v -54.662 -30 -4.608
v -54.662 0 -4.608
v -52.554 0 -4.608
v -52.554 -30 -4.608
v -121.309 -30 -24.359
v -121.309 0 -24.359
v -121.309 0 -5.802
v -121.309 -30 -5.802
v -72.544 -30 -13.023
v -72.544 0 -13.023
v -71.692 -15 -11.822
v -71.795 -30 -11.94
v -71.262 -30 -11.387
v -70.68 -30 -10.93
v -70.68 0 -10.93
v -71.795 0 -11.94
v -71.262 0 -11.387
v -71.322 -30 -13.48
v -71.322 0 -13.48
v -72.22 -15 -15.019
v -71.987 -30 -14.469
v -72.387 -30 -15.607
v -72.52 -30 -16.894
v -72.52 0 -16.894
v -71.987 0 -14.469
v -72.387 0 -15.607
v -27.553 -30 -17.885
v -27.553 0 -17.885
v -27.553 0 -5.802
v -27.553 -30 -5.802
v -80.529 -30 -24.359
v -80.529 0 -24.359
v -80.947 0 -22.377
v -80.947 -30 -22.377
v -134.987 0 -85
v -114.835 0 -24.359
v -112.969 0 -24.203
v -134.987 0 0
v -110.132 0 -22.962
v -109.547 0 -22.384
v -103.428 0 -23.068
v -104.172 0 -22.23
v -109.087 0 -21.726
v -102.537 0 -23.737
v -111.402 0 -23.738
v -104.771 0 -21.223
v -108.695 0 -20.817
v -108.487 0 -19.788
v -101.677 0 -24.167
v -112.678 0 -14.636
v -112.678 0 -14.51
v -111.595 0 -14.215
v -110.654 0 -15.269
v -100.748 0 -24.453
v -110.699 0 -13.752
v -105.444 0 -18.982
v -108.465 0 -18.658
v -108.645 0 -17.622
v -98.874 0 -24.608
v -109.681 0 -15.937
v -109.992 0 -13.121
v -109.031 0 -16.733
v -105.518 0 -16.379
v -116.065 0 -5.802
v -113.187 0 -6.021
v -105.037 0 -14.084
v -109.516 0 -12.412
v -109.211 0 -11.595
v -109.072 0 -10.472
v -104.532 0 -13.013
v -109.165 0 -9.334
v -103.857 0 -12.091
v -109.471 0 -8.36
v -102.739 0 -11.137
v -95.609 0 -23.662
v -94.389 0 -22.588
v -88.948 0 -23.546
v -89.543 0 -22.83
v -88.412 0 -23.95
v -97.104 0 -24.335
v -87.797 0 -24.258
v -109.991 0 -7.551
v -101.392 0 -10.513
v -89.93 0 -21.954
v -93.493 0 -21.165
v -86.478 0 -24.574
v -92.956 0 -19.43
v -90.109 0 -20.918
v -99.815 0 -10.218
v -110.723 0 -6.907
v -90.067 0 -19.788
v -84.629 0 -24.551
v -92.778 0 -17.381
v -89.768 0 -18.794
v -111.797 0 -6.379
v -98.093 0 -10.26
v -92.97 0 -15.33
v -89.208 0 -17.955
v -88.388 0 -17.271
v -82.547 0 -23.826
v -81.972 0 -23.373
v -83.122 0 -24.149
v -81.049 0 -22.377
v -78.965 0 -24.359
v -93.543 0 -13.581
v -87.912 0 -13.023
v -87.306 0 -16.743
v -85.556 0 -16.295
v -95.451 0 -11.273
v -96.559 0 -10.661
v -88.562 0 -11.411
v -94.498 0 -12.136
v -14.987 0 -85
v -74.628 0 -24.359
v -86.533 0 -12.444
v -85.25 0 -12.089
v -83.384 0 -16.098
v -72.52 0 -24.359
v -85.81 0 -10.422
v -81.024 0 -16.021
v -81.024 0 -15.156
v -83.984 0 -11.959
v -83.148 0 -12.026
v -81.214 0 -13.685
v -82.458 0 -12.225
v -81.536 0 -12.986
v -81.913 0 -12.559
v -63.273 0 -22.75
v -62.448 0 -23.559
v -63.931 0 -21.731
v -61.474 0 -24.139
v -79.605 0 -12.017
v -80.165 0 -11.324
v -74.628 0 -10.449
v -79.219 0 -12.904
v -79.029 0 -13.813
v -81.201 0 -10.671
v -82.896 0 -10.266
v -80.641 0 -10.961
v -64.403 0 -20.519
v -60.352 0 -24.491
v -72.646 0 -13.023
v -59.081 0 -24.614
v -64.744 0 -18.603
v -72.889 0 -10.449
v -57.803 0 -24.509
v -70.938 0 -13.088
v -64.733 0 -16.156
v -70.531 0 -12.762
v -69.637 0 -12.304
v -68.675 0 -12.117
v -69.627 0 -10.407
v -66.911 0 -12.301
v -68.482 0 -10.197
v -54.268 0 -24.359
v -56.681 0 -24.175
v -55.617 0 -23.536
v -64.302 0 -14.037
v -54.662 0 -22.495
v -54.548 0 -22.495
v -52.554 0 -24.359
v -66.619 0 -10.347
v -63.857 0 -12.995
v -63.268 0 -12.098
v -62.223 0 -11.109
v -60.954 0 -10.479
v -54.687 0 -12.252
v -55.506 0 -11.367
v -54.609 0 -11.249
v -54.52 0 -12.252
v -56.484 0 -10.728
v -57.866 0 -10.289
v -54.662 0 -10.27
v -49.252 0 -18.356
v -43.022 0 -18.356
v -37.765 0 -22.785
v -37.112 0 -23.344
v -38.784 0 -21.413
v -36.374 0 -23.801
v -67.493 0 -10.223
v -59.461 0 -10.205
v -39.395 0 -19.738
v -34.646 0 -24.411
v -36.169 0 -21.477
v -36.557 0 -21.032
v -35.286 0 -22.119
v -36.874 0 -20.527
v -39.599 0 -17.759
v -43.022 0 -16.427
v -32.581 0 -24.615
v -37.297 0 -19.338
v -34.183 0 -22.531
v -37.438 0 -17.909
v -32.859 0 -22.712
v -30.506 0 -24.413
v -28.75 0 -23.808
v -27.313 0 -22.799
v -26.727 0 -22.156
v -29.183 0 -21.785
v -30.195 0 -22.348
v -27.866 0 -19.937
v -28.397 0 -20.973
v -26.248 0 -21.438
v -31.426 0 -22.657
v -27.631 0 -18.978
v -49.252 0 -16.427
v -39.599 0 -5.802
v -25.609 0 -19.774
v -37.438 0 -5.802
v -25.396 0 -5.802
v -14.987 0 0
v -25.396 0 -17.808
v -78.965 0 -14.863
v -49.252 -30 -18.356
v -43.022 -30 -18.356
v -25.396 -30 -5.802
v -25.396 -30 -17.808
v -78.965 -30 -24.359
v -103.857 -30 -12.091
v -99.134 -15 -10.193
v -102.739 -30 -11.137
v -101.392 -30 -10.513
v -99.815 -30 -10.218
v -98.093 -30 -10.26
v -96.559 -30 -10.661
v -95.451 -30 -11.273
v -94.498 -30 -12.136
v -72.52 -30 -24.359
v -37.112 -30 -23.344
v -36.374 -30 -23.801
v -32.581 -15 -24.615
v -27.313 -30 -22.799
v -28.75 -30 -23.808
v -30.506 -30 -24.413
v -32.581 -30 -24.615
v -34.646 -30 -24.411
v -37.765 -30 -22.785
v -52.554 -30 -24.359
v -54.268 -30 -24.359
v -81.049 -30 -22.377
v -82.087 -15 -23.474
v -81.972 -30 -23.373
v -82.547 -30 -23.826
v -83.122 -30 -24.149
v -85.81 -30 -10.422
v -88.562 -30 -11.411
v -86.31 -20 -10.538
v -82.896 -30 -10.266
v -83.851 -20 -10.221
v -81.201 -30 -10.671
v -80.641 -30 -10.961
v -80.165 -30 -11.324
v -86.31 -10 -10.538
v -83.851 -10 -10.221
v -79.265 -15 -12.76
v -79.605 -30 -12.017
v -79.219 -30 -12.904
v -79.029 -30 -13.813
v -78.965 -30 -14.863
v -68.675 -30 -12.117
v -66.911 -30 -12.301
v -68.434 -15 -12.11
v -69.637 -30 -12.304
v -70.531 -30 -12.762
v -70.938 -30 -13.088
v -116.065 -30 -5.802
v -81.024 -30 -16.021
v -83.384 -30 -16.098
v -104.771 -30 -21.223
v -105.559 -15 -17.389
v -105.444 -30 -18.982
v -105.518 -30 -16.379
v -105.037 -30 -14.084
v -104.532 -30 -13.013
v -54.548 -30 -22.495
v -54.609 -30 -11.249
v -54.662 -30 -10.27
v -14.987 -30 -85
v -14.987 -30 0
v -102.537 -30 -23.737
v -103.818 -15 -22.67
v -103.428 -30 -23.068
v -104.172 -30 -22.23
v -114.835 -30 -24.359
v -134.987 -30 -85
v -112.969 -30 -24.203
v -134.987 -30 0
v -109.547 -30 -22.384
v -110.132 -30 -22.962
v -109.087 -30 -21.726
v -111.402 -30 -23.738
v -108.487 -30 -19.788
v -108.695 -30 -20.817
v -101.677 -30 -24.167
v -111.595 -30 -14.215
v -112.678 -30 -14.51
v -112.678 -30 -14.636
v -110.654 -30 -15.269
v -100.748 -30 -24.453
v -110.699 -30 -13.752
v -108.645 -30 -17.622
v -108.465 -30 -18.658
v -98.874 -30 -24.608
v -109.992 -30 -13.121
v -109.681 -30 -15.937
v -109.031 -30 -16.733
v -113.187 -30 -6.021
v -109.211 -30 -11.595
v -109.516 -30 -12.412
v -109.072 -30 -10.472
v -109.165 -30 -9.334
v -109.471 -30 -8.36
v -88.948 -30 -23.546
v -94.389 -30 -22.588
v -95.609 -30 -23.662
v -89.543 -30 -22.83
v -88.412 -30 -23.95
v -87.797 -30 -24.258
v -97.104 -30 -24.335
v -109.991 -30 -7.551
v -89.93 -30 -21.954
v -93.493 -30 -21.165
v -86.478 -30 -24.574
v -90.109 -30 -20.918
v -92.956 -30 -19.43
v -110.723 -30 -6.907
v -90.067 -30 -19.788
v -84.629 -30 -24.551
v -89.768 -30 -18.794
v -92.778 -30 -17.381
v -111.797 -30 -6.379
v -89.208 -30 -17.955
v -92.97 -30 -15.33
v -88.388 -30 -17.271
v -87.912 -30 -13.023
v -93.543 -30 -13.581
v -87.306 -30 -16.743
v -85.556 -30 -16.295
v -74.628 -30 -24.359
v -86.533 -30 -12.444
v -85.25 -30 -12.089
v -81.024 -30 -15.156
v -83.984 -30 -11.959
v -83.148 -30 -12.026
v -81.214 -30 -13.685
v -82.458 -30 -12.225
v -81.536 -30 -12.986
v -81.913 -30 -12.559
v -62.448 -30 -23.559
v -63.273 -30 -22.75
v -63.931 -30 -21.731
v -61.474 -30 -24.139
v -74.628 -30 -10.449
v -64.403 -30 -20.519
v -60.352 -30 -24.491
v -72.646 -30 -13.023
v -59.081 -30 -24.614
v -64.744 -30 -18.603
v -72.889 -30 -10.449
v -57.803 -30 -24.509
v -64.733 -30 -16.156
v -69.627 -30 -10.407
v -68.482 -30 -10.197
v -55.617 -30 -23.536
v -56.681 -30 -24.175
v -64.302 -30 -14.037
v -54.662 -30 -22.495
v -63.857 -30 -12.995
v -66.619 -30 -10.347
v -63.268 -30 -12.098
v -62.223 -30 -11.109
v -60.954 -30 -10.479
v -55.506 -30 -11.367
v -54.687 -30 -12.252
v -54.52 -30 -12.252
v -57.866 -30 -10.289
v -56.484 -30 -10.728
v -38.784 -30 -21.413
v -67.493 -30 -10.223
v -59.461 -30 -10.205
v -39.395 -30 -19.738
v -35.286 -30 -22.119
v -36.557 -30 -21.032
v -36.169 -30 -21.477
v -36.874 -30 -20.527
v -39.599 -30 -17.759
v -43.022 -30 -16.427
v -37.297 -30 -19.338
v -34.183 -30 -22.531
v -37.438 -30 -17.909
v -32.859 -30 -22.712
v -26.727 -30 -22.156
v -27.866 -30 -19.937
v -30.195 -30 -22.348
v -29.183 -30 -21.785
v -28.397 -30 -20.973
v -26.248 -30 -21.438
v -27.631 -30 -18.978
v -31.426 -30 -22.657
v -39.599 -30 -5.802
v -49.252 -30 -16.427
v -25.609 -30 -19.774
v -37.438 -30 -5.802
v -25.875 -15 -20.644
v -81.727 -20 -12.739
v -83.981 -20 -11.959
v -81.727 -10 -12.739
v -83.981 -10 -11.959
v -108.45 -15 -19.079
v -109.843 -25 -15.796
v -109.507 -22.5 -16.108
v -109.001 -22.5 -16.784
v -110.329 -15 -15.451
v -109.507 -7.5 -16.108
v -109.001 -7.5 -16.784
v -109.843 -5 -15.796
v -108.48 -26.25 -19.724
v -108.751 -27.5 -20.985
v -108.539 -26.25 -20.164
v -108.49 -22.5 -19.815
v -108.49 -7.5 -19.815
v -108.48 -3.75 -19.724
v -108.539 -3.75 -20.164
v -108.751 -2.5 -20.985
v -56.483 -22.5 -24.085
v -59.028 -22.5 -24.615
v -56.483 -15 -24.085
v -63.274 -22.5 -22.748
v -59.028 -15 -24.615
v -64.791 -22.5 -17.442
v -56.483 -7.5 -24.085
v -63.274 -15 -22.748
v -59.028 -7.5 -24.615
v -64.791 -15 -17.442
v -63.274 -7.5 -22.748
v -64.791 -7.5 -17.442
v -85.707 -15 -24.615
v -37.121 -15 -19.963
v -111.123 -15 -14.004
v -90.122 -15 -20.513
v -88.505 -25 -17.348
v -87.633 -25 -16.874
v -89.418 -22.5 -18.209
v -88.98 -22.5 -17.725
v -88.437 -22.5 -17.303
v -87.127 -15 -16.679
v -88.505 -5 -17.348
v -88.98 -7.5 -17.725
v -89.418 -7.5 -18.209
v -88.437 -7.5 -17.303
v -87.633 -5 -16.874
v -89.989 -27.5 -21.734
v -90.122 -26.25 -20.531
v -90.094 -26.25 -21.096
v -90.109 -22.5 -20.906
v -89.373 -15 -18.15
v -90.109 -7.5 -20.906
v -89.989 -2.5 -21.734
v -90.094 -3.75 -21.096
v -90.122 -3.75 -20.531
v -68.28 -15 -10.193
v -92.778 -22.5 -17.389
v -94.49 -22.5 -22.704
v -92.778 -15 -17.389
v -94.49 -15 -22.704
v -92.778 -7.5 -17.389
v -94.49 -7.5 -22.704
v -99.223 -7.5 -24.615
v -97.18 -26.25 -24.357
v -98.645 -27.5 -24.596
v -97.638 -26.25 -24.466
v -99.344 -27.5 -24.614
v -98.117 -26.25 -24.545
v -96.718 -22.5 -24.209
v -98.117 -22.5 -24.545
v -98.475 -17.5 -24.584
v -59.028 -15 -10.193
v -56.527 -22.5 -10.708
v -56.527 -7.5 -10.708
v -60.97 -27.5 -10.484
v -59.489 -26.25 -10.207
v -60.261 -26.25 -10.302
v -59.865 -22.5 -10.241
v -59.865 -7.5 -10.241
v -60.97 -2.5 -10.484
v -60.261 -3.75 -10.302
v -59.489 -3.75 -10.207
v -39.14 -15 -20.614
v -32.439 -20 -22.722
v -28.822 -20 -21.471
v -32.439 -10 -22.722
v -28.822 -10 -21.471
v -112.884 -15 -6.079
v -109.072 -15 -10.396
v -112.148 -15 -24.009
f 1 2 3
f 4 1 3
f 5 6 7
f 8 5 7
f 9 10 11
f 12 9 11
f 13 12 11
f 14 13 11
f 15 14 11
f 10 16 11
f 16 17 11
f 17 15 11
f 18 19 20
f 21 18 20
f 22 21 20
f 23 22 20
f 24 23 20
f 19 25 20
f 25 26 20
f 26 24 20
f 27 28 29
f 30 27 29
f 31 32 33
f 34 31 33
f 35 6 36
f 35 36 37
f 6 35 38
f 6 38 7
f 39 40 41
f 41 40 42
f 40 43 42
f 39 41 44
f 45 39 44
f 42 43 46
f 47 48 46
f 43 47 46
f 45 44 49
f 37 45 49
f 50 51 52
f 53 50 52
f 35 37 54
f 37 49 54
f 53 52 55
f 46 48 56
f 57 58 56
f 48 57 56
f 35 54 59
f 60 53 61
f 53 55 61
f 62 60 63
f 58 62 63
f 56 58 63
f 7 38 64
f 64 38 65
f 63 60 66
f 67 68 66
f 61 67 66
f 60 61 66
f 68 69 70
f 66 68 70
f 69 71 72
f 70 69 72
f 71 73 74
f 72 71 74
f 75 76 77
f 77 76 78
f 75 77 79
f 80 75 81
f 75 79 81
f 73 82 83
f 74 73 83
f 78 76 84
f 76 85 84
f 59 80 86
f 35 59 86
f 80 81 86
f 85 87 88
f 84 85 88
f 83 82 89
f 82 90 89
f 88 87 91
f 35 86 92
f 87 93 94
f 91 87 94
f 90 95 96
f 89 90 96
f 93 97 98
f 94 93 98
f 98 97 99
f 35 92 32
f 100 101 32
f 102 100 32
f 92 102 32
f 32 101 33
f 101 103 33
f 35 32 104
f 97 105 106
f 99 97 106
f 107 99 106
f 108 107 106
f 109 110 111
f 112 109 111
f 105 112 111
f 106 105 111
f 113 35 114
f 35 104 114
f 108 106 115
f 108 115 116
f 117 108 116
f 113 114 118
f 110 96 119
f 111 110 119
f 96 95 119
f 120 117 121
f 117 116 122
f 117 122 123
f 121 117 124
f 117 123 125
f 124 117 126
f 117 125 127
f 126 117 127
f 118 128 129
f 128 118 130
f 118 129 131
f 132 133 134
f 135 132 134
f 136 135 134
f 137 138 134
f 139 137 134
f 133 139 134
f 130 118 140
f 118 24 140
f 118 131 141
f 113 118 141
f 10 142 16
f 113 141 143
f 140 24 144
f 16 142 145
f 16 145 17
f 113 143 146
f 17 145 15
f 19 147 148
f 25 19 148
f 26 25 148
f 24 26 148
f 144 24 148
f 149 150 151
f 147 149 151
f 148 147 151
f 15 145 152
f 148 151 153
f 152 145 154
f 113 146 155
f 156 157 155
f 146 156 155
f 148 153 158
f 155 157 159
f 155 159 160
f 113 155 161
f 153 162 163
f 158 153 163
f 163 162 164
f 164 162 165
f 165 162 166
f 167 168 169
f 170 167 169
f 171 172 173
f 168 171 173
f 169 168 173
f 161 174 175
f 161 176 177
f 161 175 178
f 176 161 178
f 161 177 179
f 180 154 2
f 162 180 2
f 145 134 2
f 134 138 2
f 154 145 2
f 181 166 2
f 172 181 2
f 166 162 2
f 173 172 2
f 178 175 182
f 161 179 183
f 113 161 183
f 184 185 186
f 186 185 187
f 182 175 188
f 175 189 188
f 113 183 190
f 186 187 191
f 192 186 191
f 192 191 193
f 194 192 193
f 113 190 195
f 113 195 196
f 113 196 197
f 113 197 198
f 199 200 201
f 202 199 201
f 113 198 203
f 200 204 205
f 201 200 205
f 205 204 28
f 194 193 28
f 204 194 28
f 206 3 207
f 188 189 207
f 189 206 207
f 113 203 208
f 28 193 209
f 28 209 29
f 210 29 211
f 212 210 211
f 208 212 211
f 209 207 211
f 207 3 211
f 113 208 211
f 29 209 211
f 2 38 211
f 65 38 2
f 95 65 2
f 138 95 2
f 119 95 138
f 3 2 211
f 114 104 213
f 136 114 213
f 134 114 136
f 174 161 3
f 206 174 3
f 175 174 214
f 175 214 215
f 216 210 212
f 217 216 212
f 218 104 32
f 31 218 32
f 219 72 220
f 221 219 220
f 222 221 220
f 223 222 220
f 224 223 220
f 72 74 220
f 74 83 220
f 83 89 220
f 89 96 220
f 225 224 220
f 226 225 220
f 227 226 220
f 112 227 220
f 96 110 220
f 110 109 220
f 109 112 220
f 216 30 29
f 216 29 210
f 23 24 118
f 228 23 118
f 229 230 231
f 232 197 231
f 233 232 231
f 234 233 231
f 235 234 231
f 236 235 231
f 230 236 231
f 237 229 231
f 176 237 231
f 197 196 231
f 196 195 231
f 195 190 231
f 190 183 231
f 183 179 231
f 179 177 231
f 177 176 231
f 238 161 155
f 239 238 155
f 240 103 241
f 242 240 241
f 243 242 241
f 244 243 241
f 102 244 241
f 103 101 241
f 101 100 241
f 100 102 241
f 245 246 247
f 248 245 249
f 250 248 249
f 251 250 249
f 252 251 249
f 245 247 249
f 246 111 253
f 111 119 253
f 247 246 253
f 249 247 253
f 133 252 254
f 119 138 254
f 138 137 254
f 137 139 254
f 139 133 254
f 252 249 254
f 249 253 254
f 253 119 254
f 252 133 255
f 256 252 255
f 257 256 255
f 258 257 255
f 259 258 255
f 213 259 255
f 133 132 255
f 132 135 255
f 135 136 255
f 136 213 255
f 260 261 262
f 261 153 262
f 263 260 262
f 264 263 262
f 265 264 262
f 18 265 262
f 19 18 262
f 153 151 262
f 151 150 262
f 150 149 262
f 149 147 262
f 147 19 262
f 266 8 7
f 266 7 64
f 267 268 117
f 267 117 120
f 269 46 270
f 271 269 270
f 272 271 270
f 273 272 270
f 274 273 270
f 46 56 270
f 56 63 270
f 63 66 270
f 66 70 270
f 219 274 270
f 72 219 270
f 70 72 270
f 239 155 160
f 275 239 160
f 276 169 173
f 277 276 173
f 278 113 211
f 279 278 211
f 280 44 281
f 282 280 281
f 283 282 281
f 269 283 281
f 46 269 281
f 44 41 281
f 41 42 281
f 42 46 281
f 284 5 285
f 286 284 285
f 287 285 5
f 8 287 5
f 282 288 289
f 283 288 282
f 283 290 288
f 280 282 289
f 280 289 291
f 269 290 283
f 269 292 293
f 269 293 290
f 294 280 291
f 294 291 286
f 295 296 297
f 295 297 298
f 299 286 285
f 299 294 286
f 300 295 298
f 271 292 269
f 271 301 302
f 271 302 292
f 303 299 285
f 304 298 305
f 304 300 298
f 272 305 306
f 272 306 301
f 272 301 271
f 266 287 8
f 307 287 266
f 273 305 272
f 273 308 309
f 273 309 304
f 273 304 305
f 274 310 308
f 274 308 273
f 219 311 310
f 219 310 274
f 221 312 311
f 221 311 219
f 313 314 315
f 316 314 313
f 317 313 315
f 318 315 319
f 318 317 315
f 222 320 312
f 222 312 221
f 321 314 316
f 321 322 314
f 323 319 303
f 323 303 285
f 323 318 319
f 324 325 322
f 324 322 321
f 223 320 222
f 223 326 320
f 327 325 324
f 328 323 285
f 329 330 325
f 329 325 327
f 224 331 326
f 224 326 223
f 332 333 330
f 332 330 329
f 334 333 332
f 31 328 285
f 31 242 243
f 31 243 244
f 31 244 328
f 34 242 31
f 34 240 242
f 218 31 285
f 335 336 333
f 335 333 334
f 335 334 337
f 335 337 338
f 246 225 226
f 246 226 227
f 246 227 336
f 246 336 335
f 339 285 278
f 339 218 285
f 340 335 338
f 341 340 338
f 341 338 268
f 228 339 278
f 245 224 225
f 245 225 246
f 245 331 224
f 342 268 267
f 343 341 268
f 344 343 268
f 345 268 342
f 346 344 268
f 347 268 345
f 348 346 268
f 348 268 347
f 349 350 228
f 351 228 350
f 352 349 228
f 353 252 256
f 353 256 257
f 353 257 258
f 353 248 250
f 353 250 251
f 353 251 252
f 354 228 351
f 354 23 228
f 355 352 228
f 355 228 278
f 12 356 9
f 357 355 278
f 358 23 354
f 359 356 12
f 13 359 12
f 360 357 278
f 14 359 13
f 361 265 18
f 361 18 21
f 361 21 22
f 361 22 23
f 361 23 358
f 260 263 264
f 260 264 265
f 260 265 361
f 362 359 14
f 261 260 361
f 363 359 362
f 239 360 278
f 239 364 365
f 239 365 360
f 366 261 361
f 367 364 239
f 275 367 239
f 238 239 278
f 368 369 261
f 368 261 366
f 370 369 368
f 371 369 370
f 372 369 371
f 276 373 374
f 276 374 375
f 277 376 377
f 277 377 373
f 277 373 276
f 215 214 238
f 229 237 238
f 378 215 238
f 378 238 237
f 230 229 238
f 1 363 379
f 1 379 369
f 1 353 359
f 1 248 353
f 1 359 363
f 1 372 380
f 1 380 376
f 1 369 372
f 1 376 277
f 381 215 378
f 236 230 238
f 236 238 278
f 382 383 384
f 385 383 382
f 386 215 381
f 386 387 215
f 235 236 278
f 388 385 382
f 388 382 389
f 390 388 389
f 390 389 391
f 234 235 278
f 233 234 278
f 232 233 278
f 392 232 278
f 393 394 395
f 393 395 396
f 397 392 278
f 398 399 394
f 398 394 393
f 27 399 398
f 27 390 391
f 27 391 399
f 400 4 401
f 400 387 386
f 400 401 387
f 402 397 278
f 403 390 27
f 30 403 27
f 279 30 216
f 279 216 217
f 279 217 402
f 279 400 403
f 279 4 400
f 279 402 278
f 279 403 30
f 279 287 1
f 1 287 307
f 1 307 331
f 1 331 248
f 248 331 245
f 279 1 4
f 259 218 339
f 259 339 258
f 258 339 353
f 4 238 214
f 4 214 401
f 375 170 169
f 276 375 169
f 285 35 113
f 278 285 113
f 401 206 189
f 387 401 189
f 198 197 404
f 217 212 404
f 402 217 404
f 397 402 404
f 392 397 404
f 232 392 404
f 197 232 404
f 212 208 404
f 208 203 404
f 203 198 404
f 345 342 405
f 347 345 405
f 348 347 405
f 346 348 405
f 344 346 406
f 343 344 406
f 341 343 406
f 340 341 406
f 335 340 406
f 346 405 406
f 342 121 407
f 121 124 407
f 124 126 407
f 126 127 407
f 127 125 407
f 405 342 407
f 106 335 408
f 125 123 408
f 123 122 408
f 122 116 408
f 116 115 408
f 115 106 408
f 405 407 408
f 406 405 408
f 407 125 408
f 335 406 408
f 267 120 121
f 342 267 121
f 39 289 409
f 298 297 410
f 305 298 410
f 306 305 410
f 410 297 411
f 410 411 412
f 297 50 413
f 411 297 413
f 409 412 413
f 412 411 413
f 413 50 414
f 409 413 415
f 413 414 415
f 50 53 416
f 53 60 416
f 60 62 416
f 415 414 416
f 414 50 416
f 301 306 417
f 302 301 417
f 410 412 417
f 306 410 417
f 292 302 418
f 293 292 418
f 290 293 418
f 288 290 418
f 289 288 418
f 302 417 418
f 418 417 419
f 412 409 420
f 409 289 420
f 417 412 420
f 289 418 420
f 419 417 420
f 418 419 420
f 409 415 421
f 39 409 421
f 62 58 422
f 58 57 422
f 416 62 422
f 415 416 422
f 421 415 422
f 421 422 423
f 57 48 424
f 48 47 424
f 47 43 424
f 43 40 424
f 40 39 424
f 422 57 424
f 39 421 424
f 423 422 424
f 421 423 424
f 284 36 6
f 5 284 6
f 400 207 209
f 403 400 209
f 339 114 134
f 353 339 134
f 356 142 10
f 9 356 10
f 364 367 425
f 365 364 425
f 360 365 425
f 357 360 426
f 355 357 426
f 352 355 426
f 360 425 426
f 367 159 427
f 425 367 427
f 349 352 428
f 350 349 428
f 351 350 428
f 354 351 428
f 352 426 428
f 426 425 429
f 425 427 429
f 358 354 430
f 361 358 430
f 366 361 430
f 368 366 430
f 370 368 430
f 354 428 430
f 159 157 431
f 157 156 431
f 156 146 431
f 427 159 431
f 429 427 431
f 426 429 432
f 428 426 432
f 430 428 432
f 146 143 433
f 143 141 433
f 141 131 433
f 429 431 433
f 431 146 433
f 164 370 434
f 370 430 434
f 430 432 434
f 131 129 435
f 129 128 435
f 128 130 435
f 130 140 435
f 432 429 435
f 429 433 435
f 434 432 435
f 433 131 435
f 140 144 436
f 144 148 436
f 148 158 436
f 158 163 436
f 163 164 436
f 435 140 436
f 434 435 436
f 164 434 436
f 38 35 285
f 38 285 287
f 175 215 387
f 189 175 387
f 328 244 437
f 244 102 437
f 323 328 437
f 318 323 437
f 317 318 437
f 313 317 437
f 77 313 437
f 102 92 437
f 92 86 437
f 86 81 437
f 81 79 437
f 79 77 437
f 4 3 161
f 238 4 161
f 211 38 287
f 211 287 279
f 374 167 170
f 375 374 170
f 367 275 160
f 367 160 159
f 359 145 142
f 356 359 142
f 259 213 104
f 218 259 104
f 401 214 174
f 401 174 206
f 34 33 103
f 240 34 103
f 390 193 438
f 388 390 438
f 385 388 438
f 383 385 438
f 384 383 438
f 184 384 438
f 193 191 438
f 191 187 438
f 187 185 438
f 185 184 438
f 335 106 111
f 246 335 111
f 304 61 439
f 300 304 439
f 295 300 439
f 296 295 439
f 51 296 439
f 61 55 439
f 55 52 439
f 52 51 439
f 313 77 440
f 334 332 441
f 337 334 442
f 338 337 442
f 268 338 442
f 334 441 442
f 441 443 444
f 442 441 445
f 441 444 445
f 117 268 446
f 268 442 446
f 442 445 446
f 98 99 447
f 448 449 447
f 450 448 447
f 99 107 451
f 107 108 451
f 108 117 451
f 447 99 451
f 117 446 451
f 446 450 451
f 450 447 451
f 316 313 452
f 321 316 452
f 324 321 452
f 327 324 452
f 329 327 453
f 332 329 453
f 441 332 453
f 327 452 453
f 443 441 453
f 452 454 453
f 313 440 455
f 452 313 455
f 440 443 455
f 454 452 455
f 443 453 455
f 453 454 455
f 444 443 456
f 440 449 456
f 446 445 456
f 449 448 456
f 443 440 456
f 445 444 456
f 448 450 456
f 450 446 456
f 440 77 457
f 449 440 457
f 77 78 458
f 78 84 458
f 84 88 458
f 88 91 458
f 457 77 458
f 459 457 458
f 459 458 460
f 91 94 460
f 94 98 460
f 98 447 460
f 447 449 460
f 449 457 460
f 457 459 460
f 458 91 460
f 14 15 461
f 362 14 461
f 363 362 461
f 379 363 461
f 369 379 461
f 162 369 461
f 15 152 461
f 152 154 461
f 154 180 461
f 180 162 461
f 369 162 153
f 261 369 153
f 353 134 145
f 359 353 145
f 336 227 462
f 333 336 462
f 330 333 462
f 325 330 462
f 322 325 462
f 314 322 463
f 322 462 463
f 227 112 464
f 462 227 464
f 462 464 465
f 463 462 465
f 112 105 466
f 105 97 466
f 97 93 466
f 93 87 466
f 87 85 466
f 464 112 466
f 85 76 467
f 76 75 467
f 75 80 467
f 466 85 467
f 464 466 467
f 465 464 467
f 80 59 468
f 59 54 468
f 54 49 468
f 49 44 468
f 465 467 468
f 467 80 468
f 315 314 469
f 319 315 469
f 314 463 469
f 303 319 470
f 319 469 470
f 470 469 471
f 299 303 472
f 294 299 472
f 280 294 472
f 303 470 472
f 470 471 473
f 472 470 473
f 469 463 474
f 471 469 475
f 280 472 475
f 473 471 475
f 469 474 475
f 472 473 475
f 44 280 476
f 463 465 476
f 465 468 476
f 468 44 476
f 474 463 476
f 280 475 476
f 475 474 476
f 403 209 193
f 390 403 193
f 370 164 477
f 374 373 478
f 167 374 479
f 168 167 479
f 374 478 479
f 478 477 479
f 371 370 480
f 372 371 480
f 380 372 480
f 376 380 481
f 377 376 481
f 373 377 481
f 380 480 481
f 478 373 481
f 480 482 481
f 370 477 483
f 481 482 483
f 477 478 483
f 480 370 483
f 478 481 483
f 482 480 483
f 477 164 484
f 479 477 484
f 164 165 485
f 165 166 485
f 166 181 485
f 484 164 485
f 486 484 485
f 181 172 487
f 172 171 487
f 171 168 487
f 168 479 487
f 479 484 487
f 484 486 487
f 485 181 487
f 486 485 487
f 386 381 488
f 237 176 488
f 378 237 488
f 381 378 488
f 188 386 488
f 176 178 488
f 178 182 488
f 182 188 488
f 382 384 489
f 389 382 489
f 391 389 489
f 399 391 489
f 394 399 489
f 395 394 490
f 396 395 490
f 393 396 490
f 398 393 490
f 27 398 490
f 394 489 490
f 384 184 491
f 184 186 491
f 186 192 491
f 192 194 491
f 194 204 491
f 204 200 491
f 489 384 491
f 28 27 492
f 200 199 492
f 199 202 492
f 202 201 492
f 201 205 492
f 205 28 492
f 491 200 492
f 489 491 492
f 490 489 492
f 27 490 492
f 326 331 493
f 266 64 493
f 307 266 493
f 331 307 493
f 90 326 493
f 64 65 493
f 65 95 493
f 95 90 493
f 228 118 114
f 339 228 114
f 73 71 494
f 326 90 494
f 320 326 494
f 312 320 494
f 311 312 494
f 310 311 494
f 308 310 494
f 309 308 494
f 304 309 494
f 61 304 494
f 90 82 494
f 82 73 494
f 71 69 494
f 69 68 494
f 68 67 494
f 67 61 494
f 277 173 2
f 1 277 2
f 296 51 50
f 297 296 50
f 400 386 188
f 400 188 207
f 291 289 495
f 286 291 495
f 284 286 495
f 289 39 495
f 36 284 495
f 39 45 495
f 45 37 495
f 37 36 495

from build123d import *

# Parameters (mm, degrees)
F0_W     = 120
F0_H     = 85
F0_W_2   = 6.2300768045
F0_H_2   = 1.9291306924
F1_DEPTH = 30


with BuildPart() as f1:
    # F0 (on Front) → F1 (new body)
    with BuildSketch(Plane.XZ):
        with Locations((-74.9865994975, -42.5)):
            Rectangle(F0_W, F0_H)
        with BuildLine():
            Line((-121.3085489491, -24.3586543947), (-121.3085489491, -5.8024477979))
            Line((-121.3085489491, -5.8024477979), (-116.0653747936, -5.8024477979))
            add(Edge.make_bspline(
                [(-116.0653747936, -5.8024477979), (-112.3736278476, -5.8024477979), (-110.7226981077, -6.9071289523)],
                knots=[0, 0, 0, 1, 1, 1], degree=2))
            add(Edge.make_bspline(
                [(-110.7226981077, -6.9071289523), (-109.0717683678, -8.0118101066), (-109.0717683678, -10.3958095096)],
                knots=[0, 0, 0, 1, 1, 1], degree=2))
            add(Edge.make_bspline(
                [(-109.0717683678, -10.3958095096), (-109.0717683678, -12.0487699134), (-109.9916591084, -13.1209604456)],
                knots=[0, 0, 0, 1, 1, 1], degree=2))
            add(Edge.make_bspline(
                [(-109.9916591084, -13.1209604456), (-110.9115498491, -14.1931509778), (-112.6782274306, -14.5099345441)],
                knots=[0, 0, 0, 1, 1, 1], degree=2))
            Line((-112.6782274306, -14.5099345441), (-112.6782274306, -14.6358357051))
            add(Edge.make_bspline(
                [(-112.6782274306, -14.6358357051), (-108.4503852184, -15.3587520488), (-108.4503852184, -19.0789282893)],
                knots=[0, 0, 0, 1, 1, 1], degree=2))
            add(Edge.make_bspline(
                [(-108.4503852184, -19.0789282893), (-108.4503852184, -21.5644608866), (-110.1317749166, -22.9615576407)],
                knots=[0, 0, 0, 1, 1, 1], degree=2))
            add(Edge.make_bspline(
                [(-110.1317749166, -22.9615576407), (-111.8131646148, -24.3586543947), (-114.8347924783, -24.3586543947)],
                knots=[0, 0, 0, 1, 1, 1], degree=2))
            Line((-114.8347924783, -24.3586543947), (-121.3085489491, -24.3586543947))
        make_face(mode=Mode.SUBTRACT)
        with BuildLine():
            add(Edge.make_bspline(
                [(-94.4976936528, -12.1360884606), (-92.7777213407, -14.0794338002), (-92.7777213407, -17.3894159355)],
                knots=[0, 0, 0, 1, 1, 1], degree=2))
            add(Edge.make_bspline(
                [(-92.7777213407, -17.3894159355), (-92.7777213407, -20.7928086097), (-94.4895709972, -22.7036633271)],
                knots=[0, 0, 0, 1, 1, 1], degree=2))
            add(Edge.make_bspline(
                [(-94.4895709972, -22.7036633271), (-96.2014206537, -24.6145180445), (-99.2230485172, -24.6145180445)],
                knots=[0, 0, 0, 1, 1, 1], degree=2))
            add(Edge.make_bspline(
                [(-99.2230485172, -24.6145180445), (-101.0912592929, -24.6145180445), (-102.5370919803, -23.7372712454)],
                knots=[0, 0, 0, 1, 1, 1], degree=2))
            add(Edge.make_bspline(
                [(-102.5370919803, -23.7372712454), (-103.9829246676, -22.8600244463), (-104.7708222557, -21.2233093536)],
                knots=[0, 0, 0, 1, 1, 1], degree=2))
            add(Edge.make_bspline(
                [(-104.7708222557, -21.2233093536), (-105.5587198437, -19.5865942609), (-105.5587198437, -17.3894159355)],
                knots=[0, 0, 0, 1, 1, 1], degree=2))
            add(Edge.make_bspline(
                [(-105.5587198437, -17.3894159355), (-105.5587198437, -13.9900845891), (-103.8570235067, -12.0914138551)],
                knots=[0, 0, 0, 1, 1, 1], degree=2))
            add(Edge.make_bspline(
                [(-103.8570235067, -12.0914138551), (-102.1553271696, -10.192743121), (-99.1336993061, -10.192743121)],
                knots=[0, 0, 0, 1, 1, 1], degree=2))
            add(Edge.make_bspline(
                [(-99.1336993061, -10.192743121), (-96.2176659648, -10.192743121), (-94.4976936528, -12.1360884606)],
                knots=[0, 0, 0, 1, 1, 1], degree=2))
        make_face(mode=Mode.SUBTRACT)
        with BuildLine():
            Line((-78.9651455832, -24.3586543947), (-80.528756776, -24.3586543947))
            Line((-80.528756776, -24.3586543947), (-80.9470735367, -22.3767264413))
            Line((-80.9470735367, -22.3767264413), (-81.048606731, -22.3767264413))
            add(Edge.make_bspline(
                [(-81.048606731, -22.3767264413), (-82.088306641, -23.6844739844), (-83.1219145593, -24.1494960144)],
                knots=[0, 0, 0, 1, 1, 1], degree=2))
            add(Edge.make_bspline(
                [(-83.1219145593, -24.1494960144), (-84.1555224777, -24.6145180445), (-85.7069496871, -24.6145180445)],
                knots=[0, 0, 0, 1, 1, 1], degree=2))
            add(Edge.make_bspline(
                [(-85.7069496871, -24.6145180445), (-87.7741655238, -24.6145180445), (-88.9478892503, -23.5463888401)],
                knots=[0, 0, 0, 1, 1, 1], degree=2))
            add(Edge.make_bspline(
                [(-88.9478892503, -23.5463888401), (-90.1216129769, -22.4782596356), (-90.1216129769, -20.5125769933)],
                knots=[0, 0, 0, 1, 1, 1], degree=2))
            add(Edge.make_bspline(
                [(-90.1216129769, -20.5125769933), (-90.1216129769, -16.3009800922), (-83.3838702007, -16.0979137036)],
                knots=[0, 0, 0, 1, 1, 1], degree=2))
            Line((-83.3838702007, -16.0979137036), (-81.0242387644, -16.0207484759))
            Line((-81.0242387644, -16.0207484759), (-81.0242387644, -15.1556856601))
            add(Edge.make_bspline(
                [(-81.0242387644, -15.1556856601), (-81.0242387644, -13.5189705674), (-81.7268484692, -12.7391956349)],
                knots=[0, 0, 0, 1, 1, 1], degree=2))
            add(Edge.make_bspline(
                [(-81.7268484692, -12.7391956349), (-82.429458174, -11.9594207024), (-83.9808853834, -11.9594207024)],
                knots=[0, 0, 0, 1, 1, 1], degree=2))
            add(Edge.make_bspline(
                [(-83.9808853834, -11.9594207024), (-85.7191336705, -11.9594207024), (-87.9122506681, -13.0234885791)],
                knots=[0, 0, 0, 1, 1, 1], degree=2))
            Line((-87.9122506681, -13.0234885791), (-88.5620631119, -11.411141453))
            add(Edge.make_bspline(
                [(-88.5620631119, -11.411141453), (-87.5345471852, -10.854739548), (-86.3100568615, -10.5379559817)],
                knots=[0, 0, 0, 1, 1, 1], degree=2))
            add(Edge.make_bspline(
                [(-86.3100568615, -10.5379559817), (-85.0855665378, -10.2211724154), (-83.8509228947, -10.2211724154)],
                knots=[0, 0, 0, 1, 1, 1], degree=2))
            add(Edge.make_bspline(
                [(-83.8509228947, -10.2211724154), (-81.3653902973, -10.2211724154), (-80.1652679403, -11.3238229059)],
                knots=[0, 0, 0, 1, 1, 1], degree=2))
            add(Edge.make_bspline(
                [(-80.1652679403, -11.3238229059), (-78.9651455832, -12.4264733964), (-78.9651455832, -14.8632700604)],
                knots=[0, 0, 0, 1, 1, 1], degree=2))
            Line((-78.9651455832, -14.8632700604), (-78.9651455832, -24.3586543947))
        make_face(mode=Mode.SUBTRACT)
        with BuildLine():
            add(Edge.make_bspline(
                [(-70.6800369254, -10.9298741119), (-69.5875397543, -10.192743121), (-68.2797922113, -10.192743121)],
                knots=[0, 0, 0, 1, 1, 1], degree=2))
            add(Edge.make_bspline(
                [(-68.2797922113, -10.192743121), (-67.3538094789, -10.192743121), (-66.618709152, -10.3470735764)],
                knots=[0, 0, 0, 1, 1, 1], degree=2))
            Line((-66.618709152, -10.3470735764), (-66.9111247516, -12.3005722354))
            add(Edge.make_bspline(
                [(-66.9111247516, -12.3005722354), (-67.7721262396, -12.10968983), (-68.4341226667, -12.10968983)],
                knots=[0, 0, 0, 1, 1, 1], degree=2))
            add(Edge.make_bspline(
                [(-68.4341226667, -12.10968983), (-70.1236350204, -12.10968983), (-71.3217267136, -13.4803879536)],
                knots=[0, 0, 0, 1, 1, 1], degree=2))
            add(Edge.make_bspline(
                [(-71.3217267136, -13.4803879536), (-72.5198184068, -14.8510860771), (-72.5198184068, -16.8939339472)],
                knots=[0, 0, 0, 1, 1, 1], degree=2))
            Line((-72.5198184068, -16.8939339472), (-72.5198184068, -24.3586543947))
            Line((-72.5198184068, -24.3586543947), (-74.6276475212, -24.3586543947))
            Line((-74.6276475212, -24.3586543947), (-74.6276475212, -10.4486067707))
            Line((-74.6276475212, -10.4486067707), (-72.8893992342, -10.4486067707))
            Line((-72.8893992342, -10.4486067707), (-72.6457195677, -13.0234885791))
            Line((-72.6457195677, -13.0234885791), (-72.5441863734, -13.0234885791))
            add(Edge.make_bspline(
                [(-72.5441863734, -13.0234885791), (-71.7725340965, -11.6670051027), (-70.6800369254, -10.9298741119)],
                knots=[0, 0, 0, 1, 1, 1], degree=2))
        make_face(mode=Mode.SUBTRACT)
        with Locations((-46.1374331905, -17.3914465994)):
            Rectangle(F0_W_2, F0_H_2, mode=Mode.SUBTRACT)
        with BuildLine():
            Line((-54.2682113929, -24.3586543947), (-54.5484430093, -22.4945049467))
            Line((-54.5484430093, -22.4945049467), (-54.6621601869, -22.4945049467))
            add(Edge.make_bspline(
                [(-54.6621601869, -22.4945049467), (-56.1201768576, -24.6145180445), (-59.0280875434, -24.6145180445)],
                knots=[0, 0, 0, 1, 1, 1], degree=2))
            add(Edge.make_bspline(
                [(-59.0280875434, -24.6145180445), (-61.7572998071, -24.6145180445), (-63.2742057305, -22.7483379326)],
                knots=[0, 0, 0, 1, 1, 1], degree=2))
            add(Edge.make_bspline(
                [(-63.2742057305, -22.7483379326), (-64.7911116539, -20.8821578207), (-64.7911116539, -17.4422131966)],
                knots=[0, 0, 0, 1, 1, 1], degree=2))
            add(Edge.make_bspline(
                [(-64.7911116539, -17.4422131966), (-64.7911116539, -14.0022685725), (-63.2681137389, -12.0975058467)],
                knots=[0, 0, 0, 1, 1, 1], degree=2))
            add(Edge.make_bspline(
                [(-63.2681137389, -12.0975058467), (-61.7451158238, -10.192743121), (-59.0280875434, -10.192743121)],
                knots=[0, 0, 0, 1, 1, 1], degree=2))
            add(Edge.make_bspline(
                [(-59.0280875434, -10.192743121), (-56.1973420853, -10.192743121), (-54.6865281536, -12.2518363021)],
                knots=[0, 0, 0, 1, 1, 1], degree=2))
            Line((-54.6865281536, -12.2518363021), (-54.5200137149, -12.2518363021))
            Line((-54.5200137149, -12.2518363021), (-54.6093629259, -11.2486883421))
            Line((-54.6093629259, -11.2486883421), (-54.6621601869, -10.2699083487))
            Line((-54.6621601869, -10.2699083487), (-54.6621601869, -4.6084174325))
            Line((-54.6621601869, -4.6084174325), (-52.5543310725, -4.6084174325))
            Line((-52.5543310725, -4.6084174325), (-52.5543310725, -24.3586543947))
            Line((-52.5543310725, -24.3586543947), (-54.2682113929, -24.3586543947))
        make_face(mode=Mode.SUBTRACT)
        with BuildLine():
            Line((-27.5527972992, -5.8024477979), (-25.3962322515, -5.8024477979))
            Line((-25.3962322515, -5.8024477979), (-25.3962322515, -17.8077326962))
            add(Edge.make_bspline(
                [(-25.3962322515, -17.8077326962), (-25.3962322515, -20.983691015), (-27.3131789606, -22.7991045297)],
                knots=[0, 0, 0, 1, 1, 1], degree=2))
            add(Edge.make_bspline(
                [(-27.3131789606, -22.7991045297), (-29.2301256696, -24.6145180445), (-32.5807210827, -24.6145180445)],
                knots=[0, 0, 0, 1, 1, 1], degree=2))
            add(Edge.make_bspline(
                [(-32.5807210827, -24.6145180445), (-35.9313164958, -24.6145180445), (-37.7650059855, -22.7848898825)],
                knots=[0, 0, 0, 1, 1, 1], degree=2))
            add(Edge.make_bspline(
                [(-37.7650059855, -22.7848898825), (-39.5986954752, -20.9552617206), (-39.5986954752, -17.7589967629)],
                knots=[0, 0, 0, 1, 1, 1], degree=2))
            Line((-39.5986954752, -17.7589967629), (-39.5986954752, -5.8024477979))
            Line((-39.5986954752, -5.8024477979), (-37.4380690998, -5.8024477979))
            Line((-37.4380690998, -5.8024477979), (-37.4380690998, -17.9092658905))
            add(Edge.make_bspline(
                [(-37.4380690998, -17.9092658905), (-37.4380690998, -20.2323453769), (-36.1689041706, -21.4771423395)],
                knots=[0, 0, 0, 1, 1, 1], degree=2))
            add(Edge.make_bspline(
                [(-36.1689041706, -21.4771423395), (-34.8997392414, -22.721939302), (-32.4385746106, -22.721939302)],
                knots=[0, 0, 0, 1, 1, 1], degree=2))
            add(Edge.make_bspline(
                [(-32.4385746106, -22.721939302), (-30.0911271576, -22.721939302), (-28.8219622284, -21.4710503478)],
                knots=[0, 0, 0, 1, 1, 1], degree=2))
            add(Edge.make_bspline(
                [(-28.8219622284, -21.4710503478), (-27.5527972992, -20.2201613936), (-27.5527972992, -17.8848979239)],
                knots=[0, 0, 0, 1, 1, 1], degree=2))
            Line((-27.5527972992, -17.8848979239), (-27.5527972992, -5.8024477979))
        make_face(mode=Mode.SUBTRACT)
    extrude(amount=F1_DEPTH)


solid = f1.part
